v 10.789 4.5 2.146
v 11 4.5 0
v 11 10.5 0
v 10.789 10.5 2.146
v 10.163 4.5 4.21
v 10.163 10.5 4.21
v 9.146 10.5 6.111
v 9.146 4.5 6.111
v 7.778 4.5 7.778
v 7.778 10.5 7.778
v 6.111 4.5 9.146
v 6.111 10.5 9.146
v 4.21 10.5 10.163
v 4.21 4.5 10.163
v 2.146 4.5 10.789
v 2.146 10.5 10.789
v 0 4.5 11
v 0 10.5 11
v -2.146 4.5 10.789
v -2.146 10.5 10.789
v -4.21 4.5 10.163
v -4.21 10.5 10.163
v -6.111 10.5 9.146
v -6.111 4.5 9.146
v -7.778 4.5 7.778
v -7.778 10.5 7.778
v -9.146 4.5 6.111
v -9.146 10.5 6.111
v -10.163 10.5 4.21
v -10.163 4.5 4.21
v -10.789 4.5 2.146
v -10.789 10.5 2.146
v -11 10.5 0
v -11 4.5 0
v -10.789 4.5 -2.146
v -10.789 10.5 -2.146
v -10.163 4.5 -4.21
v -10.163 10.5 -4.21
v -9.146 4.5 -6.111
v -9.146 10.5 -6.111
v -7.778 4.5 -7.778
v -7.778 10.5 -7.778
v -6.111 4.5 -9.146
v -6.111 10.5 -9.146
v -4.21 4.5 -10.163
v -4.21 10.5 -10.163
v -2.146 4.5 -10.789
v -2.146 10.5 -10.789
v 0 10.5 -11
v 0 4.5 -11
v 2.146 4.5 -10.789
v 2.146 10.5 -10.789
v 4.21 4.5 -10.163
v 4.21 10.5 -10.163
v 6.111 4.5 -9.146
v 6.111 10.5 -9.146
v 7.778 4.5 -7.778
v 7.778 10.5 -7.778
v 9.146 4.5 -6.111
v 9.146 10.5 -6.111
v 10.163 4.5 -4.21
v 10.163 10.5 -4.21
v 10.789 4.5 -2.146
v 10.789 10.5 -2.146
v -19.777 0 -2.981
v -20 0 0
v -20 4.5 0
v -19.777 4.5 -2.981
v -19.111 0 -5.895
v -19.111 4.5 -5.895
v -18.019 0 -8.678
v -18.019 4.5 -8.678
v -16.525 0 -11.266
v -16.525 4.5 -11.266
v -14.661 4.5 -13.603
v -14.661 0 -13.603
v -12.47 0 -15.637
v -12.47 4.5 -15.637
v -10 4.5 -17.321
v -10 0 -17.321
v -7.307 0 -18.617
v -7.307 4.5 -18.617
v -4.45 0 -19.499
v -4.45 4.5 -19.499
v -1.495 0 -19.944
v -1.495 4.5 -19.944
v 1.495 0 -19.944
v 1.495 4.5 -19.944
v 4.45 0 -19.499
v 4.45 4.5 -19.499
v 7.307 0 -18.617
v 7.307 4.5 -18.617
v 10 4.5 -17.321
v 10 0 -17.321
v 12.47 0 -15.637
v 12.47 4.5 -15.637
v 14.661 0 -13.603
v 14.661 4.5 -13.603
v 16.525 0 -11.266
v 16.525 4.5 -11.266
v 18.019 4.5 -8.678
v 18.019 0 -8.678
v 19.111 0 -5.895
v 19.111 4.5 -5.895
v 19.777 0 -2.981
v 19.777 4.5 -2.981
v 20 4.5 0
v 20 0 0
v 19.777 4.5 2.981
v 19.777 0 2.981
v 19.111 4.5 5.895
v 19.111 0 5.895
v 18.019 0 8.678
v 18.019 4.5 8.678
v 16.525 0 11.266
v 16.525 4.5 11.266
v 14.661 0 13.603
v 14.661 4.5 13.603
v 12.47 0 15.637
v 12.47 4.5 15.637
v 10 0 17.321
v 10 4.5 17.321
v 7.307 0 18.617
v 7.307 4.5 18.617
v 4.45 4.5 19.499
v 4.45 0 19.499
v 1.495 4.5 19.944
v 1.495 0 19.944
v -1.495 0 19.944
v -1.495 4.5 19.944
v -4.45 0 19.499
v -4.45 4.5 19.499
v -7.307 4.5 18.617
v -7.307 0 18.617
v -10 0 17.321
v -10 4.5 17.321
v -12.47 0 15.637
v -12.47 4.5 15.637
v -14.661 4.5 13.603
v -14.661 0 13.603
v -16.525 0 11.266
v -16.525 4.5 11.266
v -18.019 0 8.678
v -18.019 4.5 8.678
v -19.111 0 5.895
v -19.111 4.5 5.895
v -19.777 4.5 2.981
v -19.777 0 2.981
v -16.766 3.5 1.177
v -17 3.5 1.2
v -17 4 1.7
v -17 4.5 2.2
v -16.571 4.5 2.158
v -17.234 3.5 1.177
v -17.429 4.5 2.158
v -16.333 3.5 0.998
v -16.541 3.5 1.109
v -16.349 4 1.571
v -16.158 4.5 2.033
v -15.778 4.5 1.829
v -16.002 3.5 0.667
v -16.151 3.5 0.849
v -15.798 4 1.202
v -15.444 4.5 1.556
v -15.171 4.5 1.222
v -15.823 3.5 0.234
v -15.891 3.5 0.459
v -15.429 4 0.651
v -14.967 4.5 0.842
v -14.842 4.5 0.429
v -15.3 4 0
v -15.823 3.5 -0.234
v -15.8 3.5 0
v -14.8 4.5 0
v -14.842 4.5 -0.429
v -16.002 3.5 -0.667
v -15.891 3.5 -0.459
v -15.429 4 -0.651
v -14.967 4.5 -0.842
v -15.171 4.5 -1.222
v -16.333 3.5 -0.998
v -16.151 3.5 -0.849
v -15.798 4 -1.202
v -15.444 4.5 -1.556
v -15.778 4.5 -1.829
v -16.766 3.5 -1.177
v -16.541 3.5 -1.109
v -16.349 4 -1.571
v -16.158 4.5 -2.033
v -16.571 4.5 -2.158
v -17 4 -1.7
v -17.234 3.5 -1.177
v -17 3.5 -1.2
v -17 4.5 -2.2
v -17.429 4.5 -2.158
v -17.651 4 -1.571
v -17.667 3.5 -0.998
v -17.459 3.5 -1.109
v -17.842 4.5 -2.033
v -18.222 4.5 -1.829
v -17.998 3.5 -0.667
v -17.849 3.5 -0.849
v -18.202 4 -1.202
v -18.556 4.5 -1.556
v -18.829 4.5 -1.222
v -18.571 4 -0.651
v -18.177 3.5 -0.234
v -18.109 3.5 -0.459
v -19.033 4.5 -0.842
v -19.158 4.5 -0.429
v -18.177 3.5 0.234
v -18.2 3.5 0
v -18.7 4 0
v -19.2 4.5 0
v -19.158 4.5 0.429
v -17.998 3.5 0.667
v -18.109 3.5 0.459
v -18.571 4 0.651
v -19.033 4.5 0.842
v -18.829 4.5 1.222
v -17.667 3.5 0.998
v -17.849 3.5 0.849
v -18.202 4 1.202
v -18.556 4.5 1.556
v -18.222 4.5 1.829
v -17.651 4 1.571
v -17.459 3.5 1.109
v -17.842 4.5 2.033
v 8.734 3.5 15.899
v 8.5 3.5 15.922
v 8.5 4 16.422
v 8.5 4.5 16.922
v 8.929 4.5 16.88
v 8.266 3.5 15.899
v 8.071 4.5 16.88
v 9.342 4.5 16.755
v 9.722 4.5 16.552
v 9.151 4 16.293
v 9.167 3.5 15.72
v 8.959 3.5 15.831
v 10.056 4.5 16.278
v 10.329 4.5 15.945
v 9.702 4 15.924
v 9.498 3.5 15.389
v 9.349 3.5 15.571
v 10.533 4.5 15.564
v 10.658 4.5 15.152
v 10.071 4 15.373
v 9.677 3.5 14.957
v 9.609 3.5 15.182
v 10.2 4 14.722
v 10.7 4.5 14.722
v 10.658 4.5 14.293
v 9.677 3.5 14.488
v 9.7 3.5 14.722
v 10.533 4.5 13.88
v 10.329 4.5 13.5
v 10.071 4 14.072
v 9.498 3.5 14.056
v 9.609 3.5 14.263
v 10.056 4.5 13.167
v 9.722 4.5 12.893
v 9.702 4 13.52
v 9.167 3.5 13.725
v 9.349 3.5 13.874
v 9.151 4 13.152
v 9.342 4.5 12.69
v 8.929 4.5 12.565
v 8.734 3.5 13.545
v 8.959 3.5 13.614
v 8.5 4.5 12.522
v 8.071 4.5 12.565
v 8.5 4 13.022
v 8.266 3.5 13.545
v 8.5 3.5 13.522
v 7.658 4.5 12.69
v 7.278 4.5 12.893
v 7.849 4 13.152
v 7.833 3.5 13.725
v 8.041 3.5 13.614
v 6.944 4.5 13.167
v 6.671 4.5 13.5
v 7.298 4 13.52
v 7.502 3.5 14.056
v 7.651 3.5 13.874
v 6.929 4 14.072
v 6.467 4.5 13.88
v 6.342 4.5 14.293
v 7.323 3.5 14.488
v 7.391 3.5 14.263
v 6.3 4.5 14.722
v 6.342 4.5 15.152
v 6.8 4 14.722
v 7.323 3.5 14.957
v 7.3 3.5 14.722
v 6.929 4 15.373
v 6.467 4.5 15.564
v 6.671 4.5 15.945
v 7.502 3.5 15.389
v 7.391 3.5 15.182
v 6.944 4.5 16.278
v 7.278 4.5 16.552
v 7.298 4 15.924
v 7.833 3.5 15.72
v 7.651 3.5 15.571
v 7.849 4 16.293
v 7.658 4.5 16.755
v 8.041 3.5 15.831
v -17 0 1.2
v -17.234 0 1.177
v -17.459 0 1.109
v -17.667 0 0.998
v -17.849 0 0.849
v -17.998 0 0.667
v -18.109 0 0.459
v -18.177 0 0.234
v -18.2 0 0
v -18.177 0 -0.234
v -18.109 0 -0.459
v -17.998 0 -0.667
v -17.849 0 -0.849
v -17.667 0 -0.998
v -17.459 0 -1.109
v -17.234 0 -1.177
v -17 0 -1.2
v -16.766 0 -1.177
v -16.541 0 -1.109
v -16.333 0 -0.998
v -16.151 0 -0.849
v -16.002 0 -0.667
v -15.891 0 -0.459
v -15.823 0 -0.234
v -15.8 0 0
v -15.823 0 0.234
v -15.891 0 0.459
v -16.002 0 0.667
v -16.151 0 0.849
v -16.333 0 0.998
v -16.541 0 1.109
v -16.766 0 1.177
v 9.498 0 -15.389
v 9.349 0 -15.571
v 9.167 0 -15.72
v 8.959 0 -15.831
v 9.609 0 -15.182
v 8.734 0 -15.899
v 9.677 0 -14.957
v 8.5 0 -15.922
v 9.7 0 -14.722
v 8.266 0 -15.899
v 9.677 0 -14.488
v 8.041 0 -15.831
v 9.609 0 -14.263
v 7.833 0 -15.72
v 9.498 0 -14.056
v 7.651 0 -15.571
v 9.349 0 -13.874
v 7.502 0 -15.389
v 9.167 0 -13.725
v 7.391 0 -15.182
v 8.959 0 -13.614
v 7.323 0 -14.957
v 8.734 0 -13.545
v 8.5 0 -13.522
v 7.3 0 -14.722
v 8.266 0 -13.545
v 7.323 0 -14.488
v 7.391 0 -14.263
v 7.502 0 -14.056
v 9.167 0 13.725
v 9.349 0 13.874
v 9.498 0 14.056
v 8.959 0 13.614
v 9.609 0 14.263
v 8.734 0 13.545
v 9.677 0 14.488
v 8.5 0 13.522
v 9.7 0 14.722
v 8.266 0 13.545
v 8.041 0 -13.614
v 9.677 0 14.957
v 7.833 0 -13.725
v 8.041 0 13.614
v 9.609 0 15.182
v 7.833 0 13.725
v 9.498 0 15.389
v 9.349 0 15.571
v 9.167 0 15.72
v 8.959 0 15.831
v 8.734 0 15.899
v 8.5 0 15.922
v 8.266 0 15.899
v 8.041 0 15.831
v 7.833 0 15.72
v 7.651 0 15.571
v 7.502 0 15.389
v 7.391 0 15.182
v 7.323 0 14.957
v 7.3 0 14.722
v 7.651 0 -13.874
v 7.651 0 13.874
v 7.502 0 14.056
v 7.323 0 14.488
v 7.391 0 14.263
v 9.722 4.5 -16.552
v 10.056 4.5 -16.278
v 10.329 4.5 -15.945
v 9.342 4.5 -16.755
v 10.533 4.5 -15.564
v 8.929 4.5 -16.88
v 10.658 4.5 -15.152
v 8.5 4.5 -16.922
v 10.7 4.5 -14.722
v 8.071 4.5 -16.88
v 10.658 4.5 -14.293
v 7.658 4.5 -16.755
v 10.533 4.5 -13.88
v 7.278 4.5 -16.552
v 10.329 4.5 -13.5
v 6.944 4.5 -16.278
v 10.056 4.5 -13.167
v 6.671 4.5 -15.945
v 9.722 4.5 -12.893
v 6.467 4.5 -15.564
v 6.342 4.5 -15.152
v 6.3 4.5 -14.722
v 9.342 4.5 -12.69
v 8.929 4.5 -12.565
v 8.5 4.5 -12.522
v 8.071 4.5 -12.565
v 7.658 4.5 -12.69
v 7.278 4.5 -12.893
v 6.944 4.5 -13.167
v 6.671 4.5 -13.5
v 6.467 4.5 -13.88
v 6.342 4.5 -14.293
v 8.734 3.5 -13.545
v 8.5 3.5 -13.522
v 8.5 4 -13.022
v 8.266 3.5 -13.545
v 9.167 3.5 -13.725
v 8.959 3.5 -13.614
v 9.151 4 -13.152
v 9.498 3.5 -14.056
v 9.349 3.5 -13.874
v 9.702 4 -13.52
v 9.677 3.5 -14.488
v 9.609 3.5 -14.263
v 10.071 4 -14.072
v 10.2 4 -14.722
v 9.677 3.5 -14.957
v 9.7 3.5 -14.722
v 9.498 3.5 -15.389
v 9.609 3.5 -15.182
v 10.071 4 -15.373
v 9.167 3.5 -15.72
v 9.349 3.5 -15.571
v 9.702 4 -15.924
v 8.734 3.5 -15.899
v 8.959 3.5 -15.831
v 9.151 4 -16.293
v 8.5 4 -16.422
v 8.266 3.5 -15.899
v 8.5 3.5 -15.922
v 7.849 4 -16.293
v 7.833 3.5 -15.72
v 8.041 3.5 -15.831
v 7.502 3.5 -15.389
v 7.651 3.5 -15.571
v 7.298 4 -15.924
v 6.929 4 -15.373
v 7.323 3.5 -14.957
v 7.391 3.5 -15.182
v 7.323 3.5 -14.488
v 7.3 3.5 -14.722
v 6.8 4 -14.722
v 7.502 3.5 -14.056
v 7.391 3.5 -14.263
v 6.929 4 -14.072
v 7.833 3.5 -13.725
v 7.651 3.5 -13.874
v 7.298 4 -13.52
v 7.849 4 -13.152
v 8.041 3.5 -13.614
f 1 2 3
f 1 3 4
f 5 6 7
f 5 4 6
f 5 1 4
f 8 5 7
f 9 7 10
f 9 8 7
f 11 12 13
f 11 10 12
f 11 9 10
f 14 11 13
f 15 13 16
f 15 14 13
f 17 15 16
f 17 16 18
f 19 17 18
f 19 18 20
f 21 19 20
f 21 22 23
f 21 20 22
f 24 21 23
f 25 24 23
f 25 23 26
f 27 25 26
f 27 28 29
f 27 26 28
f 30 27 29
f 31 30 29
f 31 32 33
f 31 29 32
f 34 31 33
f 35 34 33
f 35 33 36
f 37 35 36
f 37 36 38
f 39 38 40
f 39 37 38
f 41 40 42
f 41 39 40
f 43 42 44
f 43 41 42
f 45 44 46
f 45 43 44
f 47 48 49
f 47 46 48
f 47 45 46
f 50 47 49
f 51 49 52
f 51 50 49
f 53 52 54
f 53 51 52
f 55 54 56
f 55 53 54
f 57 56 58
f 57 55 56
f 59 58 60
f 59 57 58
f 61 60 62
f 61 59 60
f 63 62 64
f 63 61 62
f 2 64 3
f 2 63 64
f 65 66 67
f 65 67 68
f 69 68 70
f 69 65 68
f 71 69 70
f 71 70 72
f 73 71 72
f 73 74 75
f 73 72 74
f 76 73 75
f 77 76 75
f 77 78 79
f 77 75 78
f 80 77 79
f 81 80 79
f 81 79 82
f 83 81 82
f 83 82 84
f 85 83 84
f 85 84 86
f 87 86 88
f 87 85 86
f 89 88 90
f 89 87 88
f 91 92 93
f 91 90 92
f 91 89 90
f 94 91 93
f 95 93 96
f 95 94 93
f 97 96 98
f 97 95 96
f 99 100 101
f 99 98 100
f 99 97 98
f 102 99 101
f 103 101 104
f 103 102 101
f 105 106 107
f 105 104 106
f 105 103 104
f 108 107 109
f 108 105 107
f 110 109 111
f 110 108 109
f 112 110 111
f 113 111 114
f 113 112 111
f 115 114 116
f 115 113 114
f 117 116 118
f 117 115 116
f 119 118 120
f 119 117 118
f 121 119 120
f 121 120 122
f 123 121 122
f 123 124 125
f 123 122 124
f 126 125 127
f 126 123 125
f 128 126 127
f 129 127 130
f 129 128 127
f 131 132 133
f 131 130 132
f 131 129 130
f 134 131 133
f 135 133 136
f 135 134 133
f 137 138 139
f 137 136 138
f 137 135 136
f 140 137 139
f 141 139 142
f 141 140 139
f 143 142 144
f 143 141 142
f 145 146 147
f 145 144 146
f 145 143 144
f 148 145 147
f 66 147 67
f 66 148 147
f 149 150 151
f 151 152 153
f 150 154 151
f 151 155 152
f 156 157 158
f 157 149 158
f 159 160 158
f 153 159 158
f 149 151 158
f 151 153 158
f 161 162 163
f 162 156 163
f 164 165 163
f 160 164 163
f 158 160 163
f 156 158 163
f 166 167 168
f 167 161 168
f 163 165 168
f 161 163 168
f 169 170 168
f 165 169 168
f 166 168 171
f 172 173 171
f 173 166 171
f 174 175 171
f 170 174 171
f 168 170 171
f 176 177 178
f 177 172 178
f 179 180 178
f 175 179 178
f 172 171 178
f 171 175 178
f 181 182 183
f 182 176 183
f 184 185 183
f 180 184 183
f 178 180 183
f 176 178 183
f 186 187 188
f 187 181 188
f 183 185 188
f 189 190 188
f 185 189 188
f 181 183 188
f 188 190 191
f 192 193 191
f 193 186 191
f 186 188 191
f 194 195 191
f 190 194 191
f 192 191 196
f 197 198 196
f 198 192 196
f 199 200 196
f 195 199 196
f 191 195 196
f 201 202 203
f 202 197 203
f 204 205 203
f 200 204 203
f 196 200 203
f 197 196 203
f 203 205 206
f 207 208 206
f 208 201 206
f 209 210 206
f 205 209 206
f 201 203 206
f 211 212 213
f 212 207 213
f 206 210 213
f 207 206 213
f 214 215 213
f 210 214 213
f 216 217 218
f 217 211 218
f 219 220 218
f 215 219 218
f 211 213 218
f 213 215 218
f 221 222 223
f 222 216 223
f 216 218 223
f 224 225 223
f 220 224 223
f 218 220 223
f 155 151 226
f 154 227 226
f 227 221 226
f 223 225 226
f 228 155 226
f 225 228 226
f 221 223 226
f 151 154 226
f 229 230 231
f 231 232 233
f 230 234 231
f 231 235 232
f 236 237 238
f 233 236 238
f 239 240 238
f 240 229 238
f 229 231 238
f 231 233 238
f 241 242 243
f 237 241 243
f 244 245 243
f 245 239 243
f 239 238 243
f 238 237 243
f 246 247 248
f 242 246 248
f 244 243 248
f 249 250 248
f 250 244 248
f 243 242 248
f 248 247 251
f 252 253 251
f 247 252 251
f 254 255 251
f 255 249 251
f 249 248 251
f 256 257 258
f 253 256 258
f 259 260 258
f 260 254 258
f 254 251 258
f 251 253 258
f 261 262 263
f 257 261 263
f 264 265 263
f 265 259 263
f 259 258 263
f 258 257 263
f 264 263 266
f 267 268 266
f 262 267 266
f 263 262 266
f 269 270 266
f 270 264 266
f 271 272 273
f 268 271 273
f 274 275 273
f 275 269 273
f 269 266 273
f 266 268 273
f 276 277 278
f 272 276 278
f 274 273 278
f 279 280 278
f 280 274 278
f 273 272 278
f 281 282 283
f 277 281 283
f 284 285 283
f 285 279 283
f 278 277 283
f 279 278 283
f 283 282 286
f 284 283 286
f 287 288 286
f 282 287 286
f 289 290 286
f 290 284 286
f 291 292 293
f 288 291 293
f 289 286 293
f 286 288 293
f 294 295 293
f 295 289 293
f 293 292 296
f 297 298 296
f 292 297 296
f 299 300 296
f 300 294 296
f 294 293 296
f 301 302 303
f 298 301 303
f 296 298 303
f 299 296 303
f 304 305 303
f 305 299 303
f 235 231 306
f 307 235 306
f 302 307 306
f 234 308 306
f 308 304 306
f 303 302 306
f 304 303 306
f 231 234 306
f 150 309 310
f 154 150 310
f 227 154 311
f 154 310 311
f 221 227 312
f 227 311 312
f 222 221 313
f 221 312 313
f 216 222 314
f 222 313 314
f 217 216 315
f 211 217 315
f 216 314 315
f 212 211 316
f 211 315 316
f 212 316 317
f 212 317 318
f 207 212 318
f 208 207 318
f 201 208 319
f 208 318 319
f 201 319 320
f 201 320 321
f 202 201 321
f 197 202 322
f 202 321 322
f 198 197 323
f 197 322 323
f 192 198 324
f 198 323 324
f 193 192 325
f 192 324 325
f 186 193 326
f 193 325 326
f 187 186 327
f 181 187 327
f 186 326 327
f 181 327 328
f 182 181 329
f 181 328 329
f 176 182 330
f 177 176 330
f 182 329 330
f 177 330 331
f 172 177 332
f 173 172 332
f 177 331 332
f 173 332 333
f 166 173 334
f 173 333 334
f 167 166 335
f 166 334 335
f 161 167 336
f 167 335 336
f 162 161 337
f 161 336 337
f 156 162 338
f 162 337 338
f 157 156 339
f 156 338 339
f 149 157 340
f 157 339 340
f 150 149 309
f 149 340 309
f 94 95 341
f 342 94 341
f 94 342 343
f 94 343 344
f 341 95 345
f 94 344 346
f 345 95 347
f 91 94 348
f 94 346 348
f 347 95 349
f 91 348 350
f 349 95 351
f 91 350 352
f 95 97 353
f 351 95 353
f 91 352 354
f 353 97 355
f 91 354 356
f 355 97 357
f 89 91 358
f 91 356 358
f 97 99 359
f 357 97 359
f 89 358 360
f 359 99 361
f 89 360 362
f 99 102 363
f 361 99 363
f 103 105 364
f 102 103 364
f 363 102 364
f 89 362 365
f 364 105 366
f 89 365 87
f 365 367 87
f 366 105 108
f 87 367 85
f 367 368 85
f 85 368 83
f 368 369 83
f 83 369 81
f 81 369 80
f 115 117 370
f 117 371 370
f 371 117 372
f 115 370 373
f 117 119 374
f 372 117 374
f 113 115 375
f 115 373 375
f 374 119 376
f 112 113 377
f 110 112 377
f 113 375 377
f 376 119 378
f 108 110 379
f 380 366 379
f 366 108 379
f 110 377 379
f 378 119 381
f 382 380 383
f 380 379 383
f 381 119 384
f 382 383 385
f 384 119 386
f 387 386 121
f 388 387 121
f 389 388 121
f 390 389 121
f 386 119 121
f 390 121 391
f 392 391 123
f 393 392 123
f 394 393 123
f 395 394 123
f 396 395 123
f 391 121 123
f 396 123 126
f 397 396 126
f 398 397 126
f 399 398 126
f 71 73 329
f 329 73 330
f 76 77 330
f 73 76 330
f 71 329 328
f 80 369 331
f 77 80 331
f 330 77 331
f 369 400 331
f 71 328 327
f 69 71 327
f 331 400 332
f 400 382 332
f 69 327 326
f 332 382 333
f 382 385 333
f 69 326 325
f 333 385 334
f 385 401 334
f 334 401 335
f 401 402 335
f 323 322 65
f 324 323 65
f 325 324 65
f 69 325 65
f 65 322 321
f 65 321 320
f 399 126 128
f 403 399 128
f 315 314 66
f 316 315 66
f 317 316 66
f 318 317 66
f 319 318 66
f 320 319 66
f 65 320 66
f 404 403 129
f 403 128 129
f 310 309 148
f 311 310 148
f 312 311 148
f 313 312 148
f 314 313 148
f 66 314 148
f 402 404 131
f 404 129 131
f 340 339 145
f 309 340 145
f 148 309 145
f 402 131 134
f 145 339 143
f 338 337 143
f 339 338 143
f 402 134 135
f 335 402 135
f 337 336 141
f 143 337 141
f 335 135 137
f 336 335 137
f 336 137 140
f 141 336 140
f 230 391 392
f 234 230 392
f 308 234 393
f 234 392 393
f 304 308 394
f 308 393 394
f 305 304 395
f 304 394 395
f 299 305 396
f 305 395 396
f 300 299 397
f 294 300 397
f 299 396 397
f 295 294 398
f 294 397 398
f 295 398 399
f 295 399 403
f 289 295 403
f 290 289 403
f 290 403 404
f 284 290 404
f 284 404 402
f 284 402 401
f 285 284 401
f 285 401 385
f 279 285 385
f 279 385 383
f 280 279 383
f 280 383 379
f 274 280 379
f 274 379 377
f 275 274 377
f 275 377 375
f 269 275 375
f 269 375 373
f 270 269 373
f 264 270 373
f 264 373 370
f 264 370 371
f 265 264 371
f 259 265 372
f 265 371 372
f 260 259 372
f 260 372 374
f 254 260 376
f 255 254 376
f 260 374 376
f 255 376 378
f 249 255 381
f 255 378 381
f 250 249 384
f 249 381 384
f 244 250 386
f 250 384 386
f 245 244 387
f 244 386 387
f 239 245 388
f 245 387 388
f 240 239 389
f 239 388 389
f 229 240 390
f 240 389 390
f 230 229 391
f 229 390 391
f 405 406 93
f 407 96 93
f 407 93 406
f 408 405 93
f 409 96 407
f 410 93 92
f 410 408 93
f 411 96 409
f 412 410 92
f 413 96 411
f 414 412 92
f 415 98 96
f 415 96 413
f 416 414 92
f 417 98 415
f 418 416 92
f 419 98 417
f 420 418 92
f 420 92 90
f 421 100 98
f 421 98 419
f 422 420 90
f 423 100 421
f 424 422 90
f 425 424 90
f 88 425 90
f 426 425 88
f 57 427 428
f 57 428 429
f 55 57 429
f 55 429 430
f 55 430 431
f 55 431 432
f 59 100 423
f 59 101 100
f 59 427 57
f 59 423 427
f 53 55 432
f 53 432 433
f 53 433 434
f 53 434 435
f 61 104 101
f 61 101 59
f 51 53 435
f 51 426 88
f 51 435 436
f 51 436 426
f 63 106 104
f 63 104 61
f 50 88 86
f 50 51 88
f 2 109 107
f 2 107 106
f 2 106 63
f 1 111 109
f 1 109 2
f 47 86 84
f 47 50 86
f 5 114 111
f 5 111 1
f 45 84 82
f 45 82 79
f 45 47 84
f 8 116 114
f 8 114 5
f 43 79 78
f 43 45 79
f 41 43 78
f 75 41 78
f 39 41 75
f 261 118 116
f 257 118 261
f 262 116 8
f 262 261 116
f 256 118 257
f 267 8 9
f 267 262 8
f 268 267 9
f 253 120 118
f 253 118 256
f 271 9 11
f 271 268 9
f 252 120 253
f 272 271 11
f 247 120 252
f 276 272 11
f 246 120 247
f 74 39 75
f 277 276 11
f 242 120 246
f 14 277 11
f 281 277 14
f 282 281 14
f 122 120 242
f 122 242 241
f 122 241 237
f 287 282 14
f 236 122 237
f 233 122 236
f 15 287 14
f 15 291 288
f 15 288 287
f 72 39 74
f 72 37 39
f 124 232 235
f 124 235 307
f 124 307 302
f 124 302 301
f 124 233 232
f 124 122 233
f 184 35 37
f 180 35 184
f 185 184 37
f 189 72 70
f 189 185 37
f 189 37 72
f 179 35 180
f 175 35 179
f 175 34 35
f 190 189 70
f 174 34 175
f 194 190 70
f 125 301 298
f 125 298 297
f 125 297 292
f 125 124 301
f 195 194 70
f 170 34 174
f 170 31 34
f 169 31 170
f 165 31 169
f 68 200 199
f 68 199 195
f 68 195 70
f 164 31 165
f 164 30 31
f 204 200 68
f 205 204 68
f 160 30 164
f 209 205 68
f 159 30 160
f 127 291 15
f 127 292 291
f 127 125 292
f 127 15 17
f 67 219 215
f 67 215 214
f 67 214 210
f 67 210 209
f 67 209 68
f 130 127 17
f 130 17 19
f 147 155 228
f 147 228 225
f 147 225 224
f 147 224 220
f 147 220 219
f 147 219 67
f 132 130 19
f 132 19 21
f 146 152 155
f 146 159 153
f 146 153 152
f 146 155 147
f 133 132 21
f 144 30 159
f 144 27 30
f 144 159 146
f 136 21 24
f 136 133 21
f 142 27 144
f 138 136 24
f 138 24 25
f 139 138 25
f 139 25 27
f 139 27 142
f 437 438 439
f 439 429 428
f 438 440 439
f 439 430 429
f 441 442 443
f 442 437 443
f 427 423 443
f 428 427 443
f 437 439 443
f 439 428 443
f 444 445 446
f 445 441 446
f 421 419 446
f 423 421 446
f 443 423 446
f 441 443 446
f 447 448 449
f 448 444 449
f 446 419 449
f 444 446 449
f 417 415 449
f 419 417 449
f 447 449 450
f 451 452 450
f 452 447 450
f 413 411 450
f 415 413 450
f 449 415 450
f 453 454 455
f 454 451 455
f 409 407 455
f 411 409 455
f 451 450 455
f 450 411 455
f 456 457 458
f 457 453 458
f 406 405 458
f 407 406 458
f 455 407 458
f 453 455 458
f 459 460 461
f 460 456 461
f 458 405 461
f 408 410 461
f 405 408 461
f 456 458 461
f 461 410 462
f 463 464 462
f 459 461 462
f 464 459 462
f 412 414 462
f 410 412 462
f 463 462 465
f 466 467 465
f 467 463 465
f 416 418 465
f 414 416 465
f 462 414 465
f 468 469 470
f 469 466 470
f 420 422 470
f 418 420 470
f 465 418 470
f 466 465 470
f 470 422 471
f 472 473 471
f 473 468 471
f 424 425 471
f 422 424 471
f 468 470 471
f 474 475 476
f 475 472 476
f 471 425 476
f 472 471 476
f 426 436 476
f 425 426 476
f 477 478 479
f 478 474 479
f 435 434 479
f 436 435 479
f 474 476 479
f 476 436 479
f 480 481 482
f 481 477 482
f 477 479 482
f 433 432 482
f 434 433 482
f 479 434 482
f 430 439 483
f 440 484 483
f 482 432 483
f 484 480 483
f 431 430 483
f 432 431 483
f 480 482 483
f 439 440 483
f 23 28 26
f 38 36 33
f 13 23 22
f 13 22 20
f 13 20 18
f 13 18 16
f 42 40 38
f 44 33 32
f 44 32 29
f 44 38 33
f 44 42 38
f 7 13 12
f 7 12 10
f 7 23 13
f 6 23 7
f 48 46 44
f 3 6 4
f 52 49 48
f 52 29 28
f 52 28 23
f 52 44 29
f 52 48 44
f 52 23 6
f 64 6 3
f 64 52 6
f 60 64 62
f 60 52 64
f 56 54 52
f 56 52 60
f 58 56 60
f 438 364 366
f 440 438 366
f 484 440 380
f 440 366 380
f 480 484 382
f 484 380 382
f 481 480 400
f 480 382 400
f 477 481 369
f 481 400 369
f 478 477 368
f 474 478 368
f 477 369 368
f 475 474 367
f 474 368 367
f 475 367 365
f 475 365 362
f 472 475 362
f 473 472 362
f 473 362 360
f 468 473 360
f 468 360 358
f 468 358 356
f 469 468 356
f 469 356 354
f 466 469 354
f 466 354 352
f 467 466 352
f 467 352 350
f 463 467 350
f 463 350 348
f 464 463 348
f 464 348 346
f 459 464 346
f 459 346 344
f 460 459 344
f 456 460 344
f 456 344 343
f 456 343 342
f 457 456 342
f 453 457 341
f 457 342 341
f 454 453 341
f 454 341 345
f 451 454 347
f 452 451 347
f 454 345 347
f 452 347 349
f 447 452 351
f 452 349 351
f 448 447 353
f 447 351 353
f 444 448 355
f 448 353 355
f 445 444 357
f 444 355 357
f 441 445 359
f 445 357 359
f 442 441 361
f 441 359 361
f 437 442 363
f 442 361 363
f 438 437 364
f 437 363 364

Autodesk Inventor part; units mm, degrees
ref_plane "YZ Plane" through (0, 0, 0) normal (1, 0, 0) x (0, 1, 0)
ref_plane "XZ Plane" through (0, 0, 0) normal (0, 1, 0) x (-1, 0, 0)
ref_plane "XY Plane" through (0, 0, 0) normal (0, 0, 1) x (1, 0, 0)
sketch "Sketch1" plane through (0, 0, 0) normal (0, 1, 0) x (-1, 0, 0)
  circle A0 centre (0, 0) radius 20
  dimension "d0" = 40
extrude "Extrusion1" add sketch "Sketch1" along normal blind 4.5
sketch "Sketch2" plane through (0, 4.5, 0) normal (0, 1, 0) x (1, 0, 0)
  circle A0 centre (0, 0) radius 11
  dimension "d3" = 22
extrude "Extrusion2" add sketch "Sketch2" along normal blind 6
sketch "Sketch3" plane through (0, 4.5, 0) normal (0, 1, 0) x (1, 0, 0)
  line L0 (0, -21.0157) -> (0, 24.936) construction
  line L1 (-27.3573, 0) -> (21.7209, 0) construction
  circle A0 centre (0, 0) radius 17 construction
  point P0 (-17, 0)
  point P1 (8.5, -14.7224)
  point P2 (8.5, 14.7224)
  dimension "d6" = 34
  dimension "d9" = 360
hole "Hole1" at (-17, 4.5, 0) at (8.5, 4.5, 14.7224) at (8.5, 4.5, -14.7224) direction (0, -1, 0) diameter 2.4 end through all countersink diameter 4.4 countersink angle 90 clearance for "Countersunk Flat Head Screw ISO 2009/7046" size "M2" standard "ISO"
properties part number "EChem _S200 Cap Base"
